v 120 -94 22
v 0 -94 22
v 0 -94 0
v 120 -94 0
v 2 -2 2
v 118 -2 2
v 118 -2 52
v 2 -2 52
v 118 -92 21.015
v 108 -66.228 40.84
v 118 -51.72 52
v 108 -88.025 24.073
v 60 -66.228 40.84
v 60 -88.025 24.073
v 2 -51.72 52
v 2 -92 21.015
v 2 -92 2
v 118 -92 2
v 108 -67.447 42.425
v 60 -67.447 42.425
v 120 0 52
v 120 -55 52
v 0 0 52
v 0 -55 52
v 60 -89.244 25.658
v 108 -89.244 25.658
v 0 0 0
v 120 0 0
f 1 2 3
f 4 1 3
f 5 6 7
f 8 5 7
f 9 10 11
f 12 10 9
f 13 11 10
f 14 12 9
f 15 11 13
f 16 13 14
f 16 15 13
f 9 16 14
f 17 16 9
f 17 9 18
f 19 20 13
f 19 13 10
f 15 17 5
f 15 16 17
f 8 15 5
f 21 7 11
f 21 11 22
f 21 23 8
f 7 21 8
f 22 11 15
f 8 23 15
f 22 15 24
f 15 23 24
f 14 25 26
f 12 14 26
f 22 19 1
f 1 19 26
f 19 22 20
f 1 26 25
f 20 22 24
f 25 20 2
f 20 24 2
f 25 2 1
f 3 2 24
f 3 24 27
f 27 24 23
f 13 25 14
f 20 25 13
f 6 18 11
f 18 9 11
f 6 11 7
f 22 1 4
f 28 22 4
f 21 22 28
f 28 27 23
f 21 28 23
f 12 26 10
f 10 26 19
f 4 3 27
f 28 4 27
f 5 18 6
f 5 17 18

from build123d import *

# Parameters (mm, degrees)
F1_DEPTH = 120
F2_T     = -2
F3_W     = 48
F3_H     = 27.5
F4_DEPTH = 3


with BuildPart() as f1:
    # F0 (on Right) → F1 (new body)
    with BuildSketch(Plane.YZ):
        Polygon((0, 0), (0, 52), (-55, 52), (-94, 22), (-94, 0), align=None)
    extrude(amount=F1_DEPTH)

    # F2
    f2_openings = [f1.faces().sort_by_distance(p)[0] for p in [
        (60, -27.5, 52),
    ]]
    offset(amount=F2_T, openings=f2_openings, kind=Kind.INTERSECTION)

    # F3 (on face) → F4 (cut)
    with BuildSketch(Plane(origin=(0, -45.5762081784, 59.249070632), x_dir=(1, 0, 0), z_dir=(0, -0.6097107608, 0.7926239891))):
        with Locations((84, -41.3430182371)):
            Rectangle(F3_W, F3_H)
    extrude(amount=-F4_DEPTH, mode=Mode.SUBTRACT)


solid = f1.part
